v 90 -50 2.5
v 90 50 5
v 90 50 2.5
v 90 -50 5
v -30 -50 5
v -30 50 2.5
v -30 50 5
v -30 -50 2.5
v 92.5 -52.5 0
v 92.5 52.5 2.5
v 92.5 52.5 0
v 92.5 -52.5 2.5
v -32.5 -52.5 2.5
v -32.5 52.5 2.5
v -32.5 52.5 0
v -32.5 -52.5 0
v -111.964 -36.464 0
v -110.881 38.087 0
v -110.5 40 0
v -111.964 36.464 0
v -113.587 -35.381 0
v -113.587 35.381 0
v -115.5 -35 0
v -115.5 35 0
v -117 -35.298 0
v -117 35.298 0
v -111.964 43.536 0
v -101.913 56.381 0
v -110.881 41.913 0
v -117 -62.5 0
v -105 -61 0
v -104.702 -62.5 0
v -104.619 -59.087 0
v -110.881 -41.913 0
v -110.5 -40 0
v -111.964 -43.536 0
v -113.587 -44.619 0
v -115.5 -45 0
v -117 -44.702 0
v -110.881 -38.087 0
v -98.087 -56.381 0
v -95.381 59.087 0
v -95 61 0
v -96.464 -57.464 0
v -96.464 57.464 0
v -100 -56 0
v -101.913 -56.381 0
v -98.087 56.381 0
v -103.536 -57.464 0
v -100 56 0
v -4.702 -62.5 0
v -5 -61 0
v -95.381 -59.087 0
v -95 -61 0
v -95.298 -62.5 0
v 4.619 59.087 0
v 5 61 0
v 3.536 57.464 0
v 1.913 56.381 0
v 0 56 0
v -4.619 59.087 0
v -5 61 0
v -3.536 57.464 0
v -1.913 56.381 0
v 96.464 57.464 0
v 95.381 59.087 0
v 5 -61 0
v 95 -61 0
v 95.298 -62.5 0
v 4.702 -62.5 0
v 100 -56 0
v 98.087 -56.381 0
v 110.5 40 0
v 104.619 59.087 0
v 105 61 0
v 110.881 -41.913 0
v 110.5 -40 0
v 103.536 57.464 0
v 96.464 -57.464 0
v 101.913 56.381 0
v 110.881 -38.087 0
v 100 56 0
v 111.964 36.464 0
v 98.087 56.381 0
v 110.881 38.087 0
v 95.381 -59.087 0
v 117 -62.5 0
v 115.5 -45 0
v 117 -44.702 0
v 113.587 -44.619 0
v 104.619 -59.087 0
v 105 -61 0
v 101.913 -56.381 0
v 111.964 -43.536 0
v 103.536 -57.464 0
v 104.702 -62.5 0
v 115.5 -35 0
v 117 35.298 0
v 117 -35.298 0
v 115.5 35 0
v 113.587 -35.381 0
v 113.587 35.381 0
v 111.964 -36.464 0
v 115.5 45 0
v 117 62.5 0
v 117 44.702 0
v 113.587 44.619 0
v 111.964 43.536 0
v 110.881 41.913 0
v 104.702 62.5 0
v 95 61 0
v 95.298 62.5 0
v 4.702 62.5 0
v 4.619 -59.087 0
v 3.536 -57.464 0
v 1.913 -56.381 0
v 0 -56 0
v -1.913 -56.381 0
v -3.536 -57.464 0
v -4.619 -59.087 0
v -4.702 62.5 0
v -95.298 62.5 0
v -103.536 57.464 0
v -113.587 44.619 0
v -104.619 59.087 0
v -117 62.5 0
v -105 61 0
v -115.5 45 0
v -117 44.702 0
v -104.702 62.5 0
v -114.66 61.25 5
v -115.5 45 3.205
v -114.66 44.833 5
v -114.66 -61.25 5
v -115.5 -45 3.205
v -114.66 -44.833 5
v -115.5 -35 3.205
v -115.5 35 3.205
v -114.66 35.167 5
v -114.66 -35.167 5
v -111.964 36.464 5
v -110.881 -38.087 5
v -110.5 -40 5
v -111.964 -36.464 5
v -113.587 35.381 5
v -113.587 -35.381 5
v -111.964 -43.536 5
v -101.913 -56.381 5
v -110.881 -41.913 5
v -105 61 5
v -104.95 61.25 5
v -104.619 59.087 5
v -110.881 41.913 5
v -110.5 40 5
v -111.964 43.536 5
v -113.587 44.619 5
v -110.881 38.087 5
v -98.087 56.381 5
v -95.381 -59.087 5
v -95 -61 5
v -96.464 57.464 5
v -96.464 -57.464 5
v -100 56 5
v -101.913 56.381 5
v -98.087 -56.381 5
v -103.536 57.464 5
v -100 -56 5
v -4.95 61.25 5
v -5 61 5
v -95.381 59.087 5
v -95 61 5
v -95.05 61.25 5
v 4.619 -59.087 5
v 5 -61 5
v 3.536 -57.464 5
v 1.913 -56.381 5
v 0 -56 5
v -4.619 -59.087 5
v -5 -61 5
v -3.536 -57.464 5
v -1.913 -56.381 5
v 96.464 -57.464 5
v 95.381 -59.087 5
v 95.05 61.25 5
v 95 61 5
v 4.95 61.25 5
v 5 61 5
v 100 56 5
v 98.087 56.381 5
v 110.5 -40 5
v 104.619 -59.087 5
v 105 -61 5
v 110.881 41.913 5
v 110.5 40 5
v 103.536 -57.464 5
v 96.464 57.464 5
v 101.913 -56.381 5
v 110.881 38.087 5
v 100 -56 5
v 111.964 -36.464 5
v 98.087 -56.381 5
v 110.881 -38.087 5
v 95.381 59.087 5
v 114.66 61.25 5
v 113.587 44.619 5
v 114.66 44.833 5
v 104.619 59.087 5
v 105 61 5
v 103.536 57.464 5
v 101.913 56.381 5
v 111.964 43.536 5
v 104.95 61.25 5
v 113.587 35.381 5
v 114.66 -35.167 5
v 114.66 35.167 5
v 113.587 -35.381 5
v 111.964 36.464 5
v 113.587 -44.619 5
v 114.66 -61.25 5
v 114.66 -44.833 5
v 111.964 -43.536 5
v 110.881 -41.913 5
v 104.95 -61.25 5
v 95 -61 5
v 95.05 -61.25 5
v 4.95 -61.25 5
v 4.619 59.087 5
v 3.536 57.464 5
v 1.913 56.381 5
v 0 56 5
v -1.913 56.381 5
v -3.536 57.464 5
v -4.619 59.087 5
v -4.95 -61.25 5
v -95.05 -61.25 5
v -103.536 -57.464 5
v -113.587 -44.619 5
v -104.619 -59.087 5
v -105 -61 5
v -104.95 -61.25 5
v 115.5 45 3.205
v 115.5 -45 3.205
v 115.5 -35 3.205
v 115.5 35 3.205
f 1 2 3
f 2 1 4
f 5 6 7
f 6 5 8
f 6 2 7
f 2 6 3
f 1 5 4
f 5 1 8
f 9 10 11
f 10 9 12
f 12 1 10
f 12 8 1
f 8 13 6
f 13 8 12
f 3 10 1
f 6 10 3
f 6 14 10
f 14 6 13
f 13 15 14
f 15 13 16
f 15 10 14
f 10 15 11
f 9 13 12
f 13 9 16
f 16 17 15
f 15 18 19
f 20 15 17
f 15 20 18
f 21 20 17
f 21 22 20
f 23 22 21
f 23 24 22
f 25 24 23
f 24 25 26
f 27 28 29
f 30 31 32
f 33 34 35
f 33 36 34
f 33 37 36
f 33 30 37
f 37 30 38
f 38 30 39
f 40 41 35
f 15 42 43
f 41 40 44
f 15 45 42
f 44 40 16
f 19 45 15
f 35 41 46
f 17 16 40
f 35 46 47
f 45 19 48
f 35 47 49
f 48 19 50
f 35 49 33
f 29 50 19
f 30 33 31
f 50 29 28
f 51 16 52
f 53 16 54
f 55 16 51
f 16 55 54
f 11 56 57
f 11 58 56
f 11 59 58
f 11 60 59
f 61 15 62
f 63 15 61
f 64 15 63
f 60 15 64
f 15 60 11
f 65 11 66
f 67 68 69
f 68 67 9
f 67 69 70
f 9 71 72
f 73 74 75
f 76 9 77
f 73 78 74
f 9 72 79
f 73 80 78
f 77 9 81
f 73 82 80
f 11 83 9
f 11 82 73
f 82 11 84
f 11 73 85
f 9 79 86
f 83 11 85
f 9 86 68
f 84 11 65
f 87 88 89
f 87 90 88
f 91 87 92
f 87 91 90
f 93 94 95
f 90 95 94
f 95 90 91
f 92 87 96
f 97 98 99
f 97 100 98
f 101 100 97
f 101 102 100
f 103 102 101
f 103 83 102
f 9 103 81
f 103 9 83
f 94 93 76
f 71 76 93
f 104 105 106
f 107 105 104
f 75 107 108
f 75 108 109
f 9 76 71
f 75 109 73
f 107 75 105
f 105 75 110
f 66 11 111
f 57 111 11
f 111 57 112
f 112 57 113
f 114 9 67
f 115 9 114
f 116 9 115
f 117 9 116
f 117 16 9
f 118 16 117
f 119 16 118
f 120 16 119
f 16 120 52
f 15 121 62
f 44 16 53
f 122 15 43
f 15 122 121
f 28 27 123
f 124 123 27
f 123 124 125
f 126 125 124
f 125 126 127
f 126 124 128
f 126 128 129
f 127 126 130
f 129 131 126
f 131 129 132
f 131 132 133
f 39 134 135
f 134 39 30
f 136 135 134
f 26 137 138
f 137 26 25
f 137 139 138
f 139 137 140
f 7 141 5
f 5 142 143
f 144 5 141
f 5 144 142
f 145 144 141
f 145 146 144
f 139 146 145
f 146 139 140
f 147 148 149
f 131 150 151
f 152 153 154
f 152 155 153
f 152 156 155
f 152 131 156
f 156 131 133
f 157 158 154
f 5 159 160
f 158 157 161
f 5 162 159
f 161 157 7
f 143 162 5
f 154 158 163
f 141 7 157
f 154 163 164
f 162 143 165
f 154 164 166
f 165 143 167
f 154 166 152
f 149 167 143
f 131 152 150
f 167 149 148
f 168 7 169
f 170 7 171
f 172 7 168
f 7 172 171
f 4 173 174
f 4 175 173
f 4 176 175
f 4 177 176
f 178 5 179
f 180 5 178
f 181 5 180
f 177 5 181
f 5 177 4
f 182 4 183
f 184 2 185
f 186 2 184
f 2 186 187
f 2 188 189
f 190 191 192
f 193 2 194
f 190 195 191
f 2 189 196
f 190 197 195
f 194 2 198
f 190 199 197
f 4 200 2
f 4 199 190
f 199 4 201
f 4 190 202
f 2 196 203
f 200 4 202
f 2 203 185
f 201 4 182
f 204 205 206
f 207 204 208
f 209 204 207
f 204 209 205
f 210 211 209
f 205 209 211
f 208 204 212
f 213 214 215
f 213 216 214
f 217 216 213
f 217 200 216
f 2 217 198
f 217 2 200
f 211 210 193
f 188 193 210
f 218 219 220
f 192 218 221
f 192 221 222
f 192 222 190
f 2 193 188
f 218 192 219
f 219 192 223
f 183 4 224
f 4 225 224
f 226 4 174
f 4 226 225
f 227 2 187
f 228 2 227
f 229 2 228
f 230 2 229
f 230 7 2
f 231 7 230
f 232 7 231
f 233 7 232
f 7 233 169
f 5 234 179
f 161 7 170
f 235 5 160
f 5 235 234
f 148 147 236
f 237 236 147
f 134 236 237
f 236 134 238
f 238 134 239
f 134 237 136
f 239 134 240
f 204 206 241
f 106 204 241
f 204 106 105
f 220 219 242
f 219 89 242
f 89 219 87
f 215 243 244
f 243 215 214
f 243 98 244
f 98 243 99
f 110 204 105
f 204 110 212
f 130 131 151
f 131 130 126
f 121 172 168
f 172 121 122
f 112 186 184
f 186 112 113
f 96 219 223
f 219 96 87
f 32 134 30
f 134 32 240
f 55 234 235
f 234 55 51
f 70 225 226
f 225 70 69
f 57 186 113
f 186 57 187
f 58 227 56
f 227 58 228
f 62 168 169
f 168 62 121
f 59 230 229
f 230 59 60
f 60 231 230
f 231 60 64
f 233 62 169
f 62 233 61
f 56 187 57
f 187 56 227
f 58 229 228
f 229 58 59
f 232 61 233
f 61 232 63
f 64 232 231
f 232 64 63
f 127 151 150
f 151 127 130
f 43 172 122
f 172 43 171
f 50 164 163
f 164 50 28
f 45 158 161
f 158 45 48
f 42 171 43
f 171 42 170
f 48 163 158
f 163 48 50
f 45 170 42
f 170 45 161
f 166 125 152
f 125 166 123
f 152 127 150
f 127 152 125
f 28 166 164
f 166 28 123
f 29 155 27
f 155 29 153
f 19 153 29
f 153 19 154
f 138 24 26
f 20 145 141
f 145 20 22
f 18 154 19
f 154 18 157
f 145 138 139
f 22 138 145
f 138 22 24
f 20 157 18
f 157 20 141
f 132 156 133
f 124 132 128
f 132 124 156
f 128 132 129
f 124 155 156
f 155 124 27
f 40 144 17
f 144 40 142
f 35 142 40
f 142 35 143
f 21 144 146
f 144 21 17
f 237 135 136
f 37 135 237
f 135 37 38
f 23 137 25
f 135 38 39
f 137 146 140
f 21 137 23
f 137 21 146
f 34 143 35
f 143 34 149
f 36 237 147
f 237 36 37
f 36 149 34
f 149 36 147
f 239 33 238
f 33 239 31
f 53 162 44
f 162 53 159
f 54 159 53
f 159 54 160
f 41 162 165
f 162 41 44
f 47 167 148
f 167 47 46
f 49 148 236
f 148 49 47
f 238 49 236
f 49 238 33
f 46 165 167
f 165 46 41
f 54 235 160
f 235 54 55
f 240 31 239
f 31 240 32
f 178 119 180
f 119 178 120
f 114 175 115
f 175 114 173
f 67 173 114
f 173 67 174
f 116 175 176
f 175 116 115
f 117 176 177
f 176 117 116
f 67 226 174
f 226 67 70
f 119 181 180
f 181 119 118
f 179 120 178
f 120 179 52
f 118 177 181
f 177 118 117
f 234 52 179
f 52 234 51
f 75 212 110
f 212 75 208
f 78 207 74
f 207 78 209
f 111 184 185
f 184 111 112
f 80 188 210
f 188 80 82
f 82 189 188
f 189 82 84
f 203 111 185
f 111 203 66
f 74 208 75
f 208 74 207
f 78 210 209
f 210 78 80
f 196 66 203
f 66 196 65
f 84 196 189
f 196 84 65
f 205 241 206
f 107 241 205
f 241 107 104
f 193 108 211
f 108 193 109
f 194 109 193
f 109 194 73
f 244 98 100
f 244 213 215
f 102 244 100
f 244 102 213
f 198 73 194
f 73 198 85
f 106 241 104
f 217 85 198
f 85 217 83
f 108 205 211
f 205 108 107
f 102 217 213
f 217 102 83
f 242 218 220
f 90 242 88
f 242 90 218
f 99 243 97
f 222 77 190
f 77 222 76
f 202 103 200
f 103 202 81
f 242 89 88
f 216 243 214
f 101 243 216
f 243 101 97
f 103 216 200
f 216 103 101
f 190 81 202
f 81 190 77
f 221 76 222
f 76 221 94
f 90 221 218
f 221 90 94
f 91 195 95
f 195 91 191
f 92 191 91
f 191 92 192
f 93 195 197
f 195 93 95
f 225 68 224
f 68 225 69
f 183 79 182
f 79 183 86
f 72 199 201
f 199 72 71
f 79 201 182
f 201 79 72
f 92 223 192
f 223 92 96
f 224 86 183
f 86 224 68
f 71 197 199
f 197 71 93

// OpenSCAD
DISPLAY_height = 100; 
DISPLAY_width = 120; 
DISPLAY_depth = 5; 

FP_width = 234;
FP_height = 125;
thickness = 2;
clearance = 0.75;


difference () {
color("green")
    linear_extrude(height = DISPLAY_depth, scale = 0.98)
        square([FP_width, FP_height], center = true);
    
    translate([30,0,0]){
        cube([DISPLAY_width, DISPLAY_height, DISPLAY_depth+10], center= true);
        cube([DISPLAY_width+5, DISPLAY_height+5, DISPLAY_depth], center= true);
    }
    
    translate([0,61,0])  // center top screw
        cylinder(20, d=10, center=true);

    translate([-100,61,0]) // top left screw.
        cylinder(20, d=10, center=true);

    translate([-115.5,40,0]) // top left screw.
        cylinder(20, d=10, center=true);

    translate([-115.5,-40,0]) // top left screw.
        cylinder(20, d=10, center=true);

    translate([-100,-61,0]) // bottom left screw.
        cylinder(20, d=10, center=true);

    translate([0,-61,0])  // center bottom screw
        cylinder(20, d=10, center=true);

    translate([100,61,0]) // top right screw.
        cylinder(20, d=10, center=true);

    translate([115.5,40,0]) // top right screw.
        cylinder(20, d=10, center=true);

    translate([115.5,-40,0]) // top right screw.
        cylinder(20, d=10, center=true);

    translate([100,-61,0]) // bottom right screw.
        cylinder(20, d=10, center=true);

}
